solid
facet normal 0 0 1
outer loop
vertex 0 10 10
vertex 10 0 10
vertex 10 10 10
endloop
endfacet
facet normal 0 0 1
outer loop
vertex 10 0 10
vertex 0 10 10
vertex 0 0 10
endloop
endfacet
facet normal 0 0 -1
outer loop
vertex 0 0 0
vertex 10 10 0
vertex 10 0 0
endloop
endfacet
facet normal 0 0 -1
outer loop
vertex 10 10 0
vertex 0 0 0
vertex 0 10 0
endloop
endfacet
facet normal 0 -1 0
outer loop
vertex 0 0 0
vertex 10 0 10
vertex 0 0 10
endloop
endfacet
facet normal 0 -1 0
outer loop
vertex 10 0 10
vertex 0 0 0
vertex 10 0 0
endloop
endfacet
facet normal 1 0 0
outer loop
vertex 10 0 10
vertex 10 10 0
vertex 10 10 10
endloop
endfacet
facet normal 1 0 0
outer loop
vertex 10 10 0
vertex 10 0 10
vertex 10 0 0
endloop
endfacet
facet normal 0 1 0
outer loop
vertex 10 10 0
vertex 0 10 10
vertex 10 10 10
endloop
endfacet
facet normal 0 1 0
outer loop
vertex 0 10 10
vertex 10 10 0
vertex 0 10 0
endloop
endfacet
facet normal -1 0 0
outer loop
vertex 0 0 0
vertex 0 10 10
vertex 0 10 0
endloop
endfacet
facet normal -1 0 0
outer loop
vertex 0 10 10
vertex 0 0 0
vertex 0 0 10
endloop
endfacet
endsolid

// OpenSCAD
// File: docsgen.scad
//   Minimal external consumer source for validating openscad_docsgen.
//
// FileSummary: External consumer smoke test for openscad_docsgen.
//
// Module: docsgen_consumer_smoke()
// Usage:
//   docsgen_consumer_smoke();
//   docsgen_consumer_smoke(size=12);
// Description:
//   Creates a cube so the source contains one real documented OpenSCAD module.
// Arguments:
//   size = Side length of the generated cube.
module docsgen_consumer_smoke(size = 10) {
    cube(size);
}

docsgen_consumer_smoke();
